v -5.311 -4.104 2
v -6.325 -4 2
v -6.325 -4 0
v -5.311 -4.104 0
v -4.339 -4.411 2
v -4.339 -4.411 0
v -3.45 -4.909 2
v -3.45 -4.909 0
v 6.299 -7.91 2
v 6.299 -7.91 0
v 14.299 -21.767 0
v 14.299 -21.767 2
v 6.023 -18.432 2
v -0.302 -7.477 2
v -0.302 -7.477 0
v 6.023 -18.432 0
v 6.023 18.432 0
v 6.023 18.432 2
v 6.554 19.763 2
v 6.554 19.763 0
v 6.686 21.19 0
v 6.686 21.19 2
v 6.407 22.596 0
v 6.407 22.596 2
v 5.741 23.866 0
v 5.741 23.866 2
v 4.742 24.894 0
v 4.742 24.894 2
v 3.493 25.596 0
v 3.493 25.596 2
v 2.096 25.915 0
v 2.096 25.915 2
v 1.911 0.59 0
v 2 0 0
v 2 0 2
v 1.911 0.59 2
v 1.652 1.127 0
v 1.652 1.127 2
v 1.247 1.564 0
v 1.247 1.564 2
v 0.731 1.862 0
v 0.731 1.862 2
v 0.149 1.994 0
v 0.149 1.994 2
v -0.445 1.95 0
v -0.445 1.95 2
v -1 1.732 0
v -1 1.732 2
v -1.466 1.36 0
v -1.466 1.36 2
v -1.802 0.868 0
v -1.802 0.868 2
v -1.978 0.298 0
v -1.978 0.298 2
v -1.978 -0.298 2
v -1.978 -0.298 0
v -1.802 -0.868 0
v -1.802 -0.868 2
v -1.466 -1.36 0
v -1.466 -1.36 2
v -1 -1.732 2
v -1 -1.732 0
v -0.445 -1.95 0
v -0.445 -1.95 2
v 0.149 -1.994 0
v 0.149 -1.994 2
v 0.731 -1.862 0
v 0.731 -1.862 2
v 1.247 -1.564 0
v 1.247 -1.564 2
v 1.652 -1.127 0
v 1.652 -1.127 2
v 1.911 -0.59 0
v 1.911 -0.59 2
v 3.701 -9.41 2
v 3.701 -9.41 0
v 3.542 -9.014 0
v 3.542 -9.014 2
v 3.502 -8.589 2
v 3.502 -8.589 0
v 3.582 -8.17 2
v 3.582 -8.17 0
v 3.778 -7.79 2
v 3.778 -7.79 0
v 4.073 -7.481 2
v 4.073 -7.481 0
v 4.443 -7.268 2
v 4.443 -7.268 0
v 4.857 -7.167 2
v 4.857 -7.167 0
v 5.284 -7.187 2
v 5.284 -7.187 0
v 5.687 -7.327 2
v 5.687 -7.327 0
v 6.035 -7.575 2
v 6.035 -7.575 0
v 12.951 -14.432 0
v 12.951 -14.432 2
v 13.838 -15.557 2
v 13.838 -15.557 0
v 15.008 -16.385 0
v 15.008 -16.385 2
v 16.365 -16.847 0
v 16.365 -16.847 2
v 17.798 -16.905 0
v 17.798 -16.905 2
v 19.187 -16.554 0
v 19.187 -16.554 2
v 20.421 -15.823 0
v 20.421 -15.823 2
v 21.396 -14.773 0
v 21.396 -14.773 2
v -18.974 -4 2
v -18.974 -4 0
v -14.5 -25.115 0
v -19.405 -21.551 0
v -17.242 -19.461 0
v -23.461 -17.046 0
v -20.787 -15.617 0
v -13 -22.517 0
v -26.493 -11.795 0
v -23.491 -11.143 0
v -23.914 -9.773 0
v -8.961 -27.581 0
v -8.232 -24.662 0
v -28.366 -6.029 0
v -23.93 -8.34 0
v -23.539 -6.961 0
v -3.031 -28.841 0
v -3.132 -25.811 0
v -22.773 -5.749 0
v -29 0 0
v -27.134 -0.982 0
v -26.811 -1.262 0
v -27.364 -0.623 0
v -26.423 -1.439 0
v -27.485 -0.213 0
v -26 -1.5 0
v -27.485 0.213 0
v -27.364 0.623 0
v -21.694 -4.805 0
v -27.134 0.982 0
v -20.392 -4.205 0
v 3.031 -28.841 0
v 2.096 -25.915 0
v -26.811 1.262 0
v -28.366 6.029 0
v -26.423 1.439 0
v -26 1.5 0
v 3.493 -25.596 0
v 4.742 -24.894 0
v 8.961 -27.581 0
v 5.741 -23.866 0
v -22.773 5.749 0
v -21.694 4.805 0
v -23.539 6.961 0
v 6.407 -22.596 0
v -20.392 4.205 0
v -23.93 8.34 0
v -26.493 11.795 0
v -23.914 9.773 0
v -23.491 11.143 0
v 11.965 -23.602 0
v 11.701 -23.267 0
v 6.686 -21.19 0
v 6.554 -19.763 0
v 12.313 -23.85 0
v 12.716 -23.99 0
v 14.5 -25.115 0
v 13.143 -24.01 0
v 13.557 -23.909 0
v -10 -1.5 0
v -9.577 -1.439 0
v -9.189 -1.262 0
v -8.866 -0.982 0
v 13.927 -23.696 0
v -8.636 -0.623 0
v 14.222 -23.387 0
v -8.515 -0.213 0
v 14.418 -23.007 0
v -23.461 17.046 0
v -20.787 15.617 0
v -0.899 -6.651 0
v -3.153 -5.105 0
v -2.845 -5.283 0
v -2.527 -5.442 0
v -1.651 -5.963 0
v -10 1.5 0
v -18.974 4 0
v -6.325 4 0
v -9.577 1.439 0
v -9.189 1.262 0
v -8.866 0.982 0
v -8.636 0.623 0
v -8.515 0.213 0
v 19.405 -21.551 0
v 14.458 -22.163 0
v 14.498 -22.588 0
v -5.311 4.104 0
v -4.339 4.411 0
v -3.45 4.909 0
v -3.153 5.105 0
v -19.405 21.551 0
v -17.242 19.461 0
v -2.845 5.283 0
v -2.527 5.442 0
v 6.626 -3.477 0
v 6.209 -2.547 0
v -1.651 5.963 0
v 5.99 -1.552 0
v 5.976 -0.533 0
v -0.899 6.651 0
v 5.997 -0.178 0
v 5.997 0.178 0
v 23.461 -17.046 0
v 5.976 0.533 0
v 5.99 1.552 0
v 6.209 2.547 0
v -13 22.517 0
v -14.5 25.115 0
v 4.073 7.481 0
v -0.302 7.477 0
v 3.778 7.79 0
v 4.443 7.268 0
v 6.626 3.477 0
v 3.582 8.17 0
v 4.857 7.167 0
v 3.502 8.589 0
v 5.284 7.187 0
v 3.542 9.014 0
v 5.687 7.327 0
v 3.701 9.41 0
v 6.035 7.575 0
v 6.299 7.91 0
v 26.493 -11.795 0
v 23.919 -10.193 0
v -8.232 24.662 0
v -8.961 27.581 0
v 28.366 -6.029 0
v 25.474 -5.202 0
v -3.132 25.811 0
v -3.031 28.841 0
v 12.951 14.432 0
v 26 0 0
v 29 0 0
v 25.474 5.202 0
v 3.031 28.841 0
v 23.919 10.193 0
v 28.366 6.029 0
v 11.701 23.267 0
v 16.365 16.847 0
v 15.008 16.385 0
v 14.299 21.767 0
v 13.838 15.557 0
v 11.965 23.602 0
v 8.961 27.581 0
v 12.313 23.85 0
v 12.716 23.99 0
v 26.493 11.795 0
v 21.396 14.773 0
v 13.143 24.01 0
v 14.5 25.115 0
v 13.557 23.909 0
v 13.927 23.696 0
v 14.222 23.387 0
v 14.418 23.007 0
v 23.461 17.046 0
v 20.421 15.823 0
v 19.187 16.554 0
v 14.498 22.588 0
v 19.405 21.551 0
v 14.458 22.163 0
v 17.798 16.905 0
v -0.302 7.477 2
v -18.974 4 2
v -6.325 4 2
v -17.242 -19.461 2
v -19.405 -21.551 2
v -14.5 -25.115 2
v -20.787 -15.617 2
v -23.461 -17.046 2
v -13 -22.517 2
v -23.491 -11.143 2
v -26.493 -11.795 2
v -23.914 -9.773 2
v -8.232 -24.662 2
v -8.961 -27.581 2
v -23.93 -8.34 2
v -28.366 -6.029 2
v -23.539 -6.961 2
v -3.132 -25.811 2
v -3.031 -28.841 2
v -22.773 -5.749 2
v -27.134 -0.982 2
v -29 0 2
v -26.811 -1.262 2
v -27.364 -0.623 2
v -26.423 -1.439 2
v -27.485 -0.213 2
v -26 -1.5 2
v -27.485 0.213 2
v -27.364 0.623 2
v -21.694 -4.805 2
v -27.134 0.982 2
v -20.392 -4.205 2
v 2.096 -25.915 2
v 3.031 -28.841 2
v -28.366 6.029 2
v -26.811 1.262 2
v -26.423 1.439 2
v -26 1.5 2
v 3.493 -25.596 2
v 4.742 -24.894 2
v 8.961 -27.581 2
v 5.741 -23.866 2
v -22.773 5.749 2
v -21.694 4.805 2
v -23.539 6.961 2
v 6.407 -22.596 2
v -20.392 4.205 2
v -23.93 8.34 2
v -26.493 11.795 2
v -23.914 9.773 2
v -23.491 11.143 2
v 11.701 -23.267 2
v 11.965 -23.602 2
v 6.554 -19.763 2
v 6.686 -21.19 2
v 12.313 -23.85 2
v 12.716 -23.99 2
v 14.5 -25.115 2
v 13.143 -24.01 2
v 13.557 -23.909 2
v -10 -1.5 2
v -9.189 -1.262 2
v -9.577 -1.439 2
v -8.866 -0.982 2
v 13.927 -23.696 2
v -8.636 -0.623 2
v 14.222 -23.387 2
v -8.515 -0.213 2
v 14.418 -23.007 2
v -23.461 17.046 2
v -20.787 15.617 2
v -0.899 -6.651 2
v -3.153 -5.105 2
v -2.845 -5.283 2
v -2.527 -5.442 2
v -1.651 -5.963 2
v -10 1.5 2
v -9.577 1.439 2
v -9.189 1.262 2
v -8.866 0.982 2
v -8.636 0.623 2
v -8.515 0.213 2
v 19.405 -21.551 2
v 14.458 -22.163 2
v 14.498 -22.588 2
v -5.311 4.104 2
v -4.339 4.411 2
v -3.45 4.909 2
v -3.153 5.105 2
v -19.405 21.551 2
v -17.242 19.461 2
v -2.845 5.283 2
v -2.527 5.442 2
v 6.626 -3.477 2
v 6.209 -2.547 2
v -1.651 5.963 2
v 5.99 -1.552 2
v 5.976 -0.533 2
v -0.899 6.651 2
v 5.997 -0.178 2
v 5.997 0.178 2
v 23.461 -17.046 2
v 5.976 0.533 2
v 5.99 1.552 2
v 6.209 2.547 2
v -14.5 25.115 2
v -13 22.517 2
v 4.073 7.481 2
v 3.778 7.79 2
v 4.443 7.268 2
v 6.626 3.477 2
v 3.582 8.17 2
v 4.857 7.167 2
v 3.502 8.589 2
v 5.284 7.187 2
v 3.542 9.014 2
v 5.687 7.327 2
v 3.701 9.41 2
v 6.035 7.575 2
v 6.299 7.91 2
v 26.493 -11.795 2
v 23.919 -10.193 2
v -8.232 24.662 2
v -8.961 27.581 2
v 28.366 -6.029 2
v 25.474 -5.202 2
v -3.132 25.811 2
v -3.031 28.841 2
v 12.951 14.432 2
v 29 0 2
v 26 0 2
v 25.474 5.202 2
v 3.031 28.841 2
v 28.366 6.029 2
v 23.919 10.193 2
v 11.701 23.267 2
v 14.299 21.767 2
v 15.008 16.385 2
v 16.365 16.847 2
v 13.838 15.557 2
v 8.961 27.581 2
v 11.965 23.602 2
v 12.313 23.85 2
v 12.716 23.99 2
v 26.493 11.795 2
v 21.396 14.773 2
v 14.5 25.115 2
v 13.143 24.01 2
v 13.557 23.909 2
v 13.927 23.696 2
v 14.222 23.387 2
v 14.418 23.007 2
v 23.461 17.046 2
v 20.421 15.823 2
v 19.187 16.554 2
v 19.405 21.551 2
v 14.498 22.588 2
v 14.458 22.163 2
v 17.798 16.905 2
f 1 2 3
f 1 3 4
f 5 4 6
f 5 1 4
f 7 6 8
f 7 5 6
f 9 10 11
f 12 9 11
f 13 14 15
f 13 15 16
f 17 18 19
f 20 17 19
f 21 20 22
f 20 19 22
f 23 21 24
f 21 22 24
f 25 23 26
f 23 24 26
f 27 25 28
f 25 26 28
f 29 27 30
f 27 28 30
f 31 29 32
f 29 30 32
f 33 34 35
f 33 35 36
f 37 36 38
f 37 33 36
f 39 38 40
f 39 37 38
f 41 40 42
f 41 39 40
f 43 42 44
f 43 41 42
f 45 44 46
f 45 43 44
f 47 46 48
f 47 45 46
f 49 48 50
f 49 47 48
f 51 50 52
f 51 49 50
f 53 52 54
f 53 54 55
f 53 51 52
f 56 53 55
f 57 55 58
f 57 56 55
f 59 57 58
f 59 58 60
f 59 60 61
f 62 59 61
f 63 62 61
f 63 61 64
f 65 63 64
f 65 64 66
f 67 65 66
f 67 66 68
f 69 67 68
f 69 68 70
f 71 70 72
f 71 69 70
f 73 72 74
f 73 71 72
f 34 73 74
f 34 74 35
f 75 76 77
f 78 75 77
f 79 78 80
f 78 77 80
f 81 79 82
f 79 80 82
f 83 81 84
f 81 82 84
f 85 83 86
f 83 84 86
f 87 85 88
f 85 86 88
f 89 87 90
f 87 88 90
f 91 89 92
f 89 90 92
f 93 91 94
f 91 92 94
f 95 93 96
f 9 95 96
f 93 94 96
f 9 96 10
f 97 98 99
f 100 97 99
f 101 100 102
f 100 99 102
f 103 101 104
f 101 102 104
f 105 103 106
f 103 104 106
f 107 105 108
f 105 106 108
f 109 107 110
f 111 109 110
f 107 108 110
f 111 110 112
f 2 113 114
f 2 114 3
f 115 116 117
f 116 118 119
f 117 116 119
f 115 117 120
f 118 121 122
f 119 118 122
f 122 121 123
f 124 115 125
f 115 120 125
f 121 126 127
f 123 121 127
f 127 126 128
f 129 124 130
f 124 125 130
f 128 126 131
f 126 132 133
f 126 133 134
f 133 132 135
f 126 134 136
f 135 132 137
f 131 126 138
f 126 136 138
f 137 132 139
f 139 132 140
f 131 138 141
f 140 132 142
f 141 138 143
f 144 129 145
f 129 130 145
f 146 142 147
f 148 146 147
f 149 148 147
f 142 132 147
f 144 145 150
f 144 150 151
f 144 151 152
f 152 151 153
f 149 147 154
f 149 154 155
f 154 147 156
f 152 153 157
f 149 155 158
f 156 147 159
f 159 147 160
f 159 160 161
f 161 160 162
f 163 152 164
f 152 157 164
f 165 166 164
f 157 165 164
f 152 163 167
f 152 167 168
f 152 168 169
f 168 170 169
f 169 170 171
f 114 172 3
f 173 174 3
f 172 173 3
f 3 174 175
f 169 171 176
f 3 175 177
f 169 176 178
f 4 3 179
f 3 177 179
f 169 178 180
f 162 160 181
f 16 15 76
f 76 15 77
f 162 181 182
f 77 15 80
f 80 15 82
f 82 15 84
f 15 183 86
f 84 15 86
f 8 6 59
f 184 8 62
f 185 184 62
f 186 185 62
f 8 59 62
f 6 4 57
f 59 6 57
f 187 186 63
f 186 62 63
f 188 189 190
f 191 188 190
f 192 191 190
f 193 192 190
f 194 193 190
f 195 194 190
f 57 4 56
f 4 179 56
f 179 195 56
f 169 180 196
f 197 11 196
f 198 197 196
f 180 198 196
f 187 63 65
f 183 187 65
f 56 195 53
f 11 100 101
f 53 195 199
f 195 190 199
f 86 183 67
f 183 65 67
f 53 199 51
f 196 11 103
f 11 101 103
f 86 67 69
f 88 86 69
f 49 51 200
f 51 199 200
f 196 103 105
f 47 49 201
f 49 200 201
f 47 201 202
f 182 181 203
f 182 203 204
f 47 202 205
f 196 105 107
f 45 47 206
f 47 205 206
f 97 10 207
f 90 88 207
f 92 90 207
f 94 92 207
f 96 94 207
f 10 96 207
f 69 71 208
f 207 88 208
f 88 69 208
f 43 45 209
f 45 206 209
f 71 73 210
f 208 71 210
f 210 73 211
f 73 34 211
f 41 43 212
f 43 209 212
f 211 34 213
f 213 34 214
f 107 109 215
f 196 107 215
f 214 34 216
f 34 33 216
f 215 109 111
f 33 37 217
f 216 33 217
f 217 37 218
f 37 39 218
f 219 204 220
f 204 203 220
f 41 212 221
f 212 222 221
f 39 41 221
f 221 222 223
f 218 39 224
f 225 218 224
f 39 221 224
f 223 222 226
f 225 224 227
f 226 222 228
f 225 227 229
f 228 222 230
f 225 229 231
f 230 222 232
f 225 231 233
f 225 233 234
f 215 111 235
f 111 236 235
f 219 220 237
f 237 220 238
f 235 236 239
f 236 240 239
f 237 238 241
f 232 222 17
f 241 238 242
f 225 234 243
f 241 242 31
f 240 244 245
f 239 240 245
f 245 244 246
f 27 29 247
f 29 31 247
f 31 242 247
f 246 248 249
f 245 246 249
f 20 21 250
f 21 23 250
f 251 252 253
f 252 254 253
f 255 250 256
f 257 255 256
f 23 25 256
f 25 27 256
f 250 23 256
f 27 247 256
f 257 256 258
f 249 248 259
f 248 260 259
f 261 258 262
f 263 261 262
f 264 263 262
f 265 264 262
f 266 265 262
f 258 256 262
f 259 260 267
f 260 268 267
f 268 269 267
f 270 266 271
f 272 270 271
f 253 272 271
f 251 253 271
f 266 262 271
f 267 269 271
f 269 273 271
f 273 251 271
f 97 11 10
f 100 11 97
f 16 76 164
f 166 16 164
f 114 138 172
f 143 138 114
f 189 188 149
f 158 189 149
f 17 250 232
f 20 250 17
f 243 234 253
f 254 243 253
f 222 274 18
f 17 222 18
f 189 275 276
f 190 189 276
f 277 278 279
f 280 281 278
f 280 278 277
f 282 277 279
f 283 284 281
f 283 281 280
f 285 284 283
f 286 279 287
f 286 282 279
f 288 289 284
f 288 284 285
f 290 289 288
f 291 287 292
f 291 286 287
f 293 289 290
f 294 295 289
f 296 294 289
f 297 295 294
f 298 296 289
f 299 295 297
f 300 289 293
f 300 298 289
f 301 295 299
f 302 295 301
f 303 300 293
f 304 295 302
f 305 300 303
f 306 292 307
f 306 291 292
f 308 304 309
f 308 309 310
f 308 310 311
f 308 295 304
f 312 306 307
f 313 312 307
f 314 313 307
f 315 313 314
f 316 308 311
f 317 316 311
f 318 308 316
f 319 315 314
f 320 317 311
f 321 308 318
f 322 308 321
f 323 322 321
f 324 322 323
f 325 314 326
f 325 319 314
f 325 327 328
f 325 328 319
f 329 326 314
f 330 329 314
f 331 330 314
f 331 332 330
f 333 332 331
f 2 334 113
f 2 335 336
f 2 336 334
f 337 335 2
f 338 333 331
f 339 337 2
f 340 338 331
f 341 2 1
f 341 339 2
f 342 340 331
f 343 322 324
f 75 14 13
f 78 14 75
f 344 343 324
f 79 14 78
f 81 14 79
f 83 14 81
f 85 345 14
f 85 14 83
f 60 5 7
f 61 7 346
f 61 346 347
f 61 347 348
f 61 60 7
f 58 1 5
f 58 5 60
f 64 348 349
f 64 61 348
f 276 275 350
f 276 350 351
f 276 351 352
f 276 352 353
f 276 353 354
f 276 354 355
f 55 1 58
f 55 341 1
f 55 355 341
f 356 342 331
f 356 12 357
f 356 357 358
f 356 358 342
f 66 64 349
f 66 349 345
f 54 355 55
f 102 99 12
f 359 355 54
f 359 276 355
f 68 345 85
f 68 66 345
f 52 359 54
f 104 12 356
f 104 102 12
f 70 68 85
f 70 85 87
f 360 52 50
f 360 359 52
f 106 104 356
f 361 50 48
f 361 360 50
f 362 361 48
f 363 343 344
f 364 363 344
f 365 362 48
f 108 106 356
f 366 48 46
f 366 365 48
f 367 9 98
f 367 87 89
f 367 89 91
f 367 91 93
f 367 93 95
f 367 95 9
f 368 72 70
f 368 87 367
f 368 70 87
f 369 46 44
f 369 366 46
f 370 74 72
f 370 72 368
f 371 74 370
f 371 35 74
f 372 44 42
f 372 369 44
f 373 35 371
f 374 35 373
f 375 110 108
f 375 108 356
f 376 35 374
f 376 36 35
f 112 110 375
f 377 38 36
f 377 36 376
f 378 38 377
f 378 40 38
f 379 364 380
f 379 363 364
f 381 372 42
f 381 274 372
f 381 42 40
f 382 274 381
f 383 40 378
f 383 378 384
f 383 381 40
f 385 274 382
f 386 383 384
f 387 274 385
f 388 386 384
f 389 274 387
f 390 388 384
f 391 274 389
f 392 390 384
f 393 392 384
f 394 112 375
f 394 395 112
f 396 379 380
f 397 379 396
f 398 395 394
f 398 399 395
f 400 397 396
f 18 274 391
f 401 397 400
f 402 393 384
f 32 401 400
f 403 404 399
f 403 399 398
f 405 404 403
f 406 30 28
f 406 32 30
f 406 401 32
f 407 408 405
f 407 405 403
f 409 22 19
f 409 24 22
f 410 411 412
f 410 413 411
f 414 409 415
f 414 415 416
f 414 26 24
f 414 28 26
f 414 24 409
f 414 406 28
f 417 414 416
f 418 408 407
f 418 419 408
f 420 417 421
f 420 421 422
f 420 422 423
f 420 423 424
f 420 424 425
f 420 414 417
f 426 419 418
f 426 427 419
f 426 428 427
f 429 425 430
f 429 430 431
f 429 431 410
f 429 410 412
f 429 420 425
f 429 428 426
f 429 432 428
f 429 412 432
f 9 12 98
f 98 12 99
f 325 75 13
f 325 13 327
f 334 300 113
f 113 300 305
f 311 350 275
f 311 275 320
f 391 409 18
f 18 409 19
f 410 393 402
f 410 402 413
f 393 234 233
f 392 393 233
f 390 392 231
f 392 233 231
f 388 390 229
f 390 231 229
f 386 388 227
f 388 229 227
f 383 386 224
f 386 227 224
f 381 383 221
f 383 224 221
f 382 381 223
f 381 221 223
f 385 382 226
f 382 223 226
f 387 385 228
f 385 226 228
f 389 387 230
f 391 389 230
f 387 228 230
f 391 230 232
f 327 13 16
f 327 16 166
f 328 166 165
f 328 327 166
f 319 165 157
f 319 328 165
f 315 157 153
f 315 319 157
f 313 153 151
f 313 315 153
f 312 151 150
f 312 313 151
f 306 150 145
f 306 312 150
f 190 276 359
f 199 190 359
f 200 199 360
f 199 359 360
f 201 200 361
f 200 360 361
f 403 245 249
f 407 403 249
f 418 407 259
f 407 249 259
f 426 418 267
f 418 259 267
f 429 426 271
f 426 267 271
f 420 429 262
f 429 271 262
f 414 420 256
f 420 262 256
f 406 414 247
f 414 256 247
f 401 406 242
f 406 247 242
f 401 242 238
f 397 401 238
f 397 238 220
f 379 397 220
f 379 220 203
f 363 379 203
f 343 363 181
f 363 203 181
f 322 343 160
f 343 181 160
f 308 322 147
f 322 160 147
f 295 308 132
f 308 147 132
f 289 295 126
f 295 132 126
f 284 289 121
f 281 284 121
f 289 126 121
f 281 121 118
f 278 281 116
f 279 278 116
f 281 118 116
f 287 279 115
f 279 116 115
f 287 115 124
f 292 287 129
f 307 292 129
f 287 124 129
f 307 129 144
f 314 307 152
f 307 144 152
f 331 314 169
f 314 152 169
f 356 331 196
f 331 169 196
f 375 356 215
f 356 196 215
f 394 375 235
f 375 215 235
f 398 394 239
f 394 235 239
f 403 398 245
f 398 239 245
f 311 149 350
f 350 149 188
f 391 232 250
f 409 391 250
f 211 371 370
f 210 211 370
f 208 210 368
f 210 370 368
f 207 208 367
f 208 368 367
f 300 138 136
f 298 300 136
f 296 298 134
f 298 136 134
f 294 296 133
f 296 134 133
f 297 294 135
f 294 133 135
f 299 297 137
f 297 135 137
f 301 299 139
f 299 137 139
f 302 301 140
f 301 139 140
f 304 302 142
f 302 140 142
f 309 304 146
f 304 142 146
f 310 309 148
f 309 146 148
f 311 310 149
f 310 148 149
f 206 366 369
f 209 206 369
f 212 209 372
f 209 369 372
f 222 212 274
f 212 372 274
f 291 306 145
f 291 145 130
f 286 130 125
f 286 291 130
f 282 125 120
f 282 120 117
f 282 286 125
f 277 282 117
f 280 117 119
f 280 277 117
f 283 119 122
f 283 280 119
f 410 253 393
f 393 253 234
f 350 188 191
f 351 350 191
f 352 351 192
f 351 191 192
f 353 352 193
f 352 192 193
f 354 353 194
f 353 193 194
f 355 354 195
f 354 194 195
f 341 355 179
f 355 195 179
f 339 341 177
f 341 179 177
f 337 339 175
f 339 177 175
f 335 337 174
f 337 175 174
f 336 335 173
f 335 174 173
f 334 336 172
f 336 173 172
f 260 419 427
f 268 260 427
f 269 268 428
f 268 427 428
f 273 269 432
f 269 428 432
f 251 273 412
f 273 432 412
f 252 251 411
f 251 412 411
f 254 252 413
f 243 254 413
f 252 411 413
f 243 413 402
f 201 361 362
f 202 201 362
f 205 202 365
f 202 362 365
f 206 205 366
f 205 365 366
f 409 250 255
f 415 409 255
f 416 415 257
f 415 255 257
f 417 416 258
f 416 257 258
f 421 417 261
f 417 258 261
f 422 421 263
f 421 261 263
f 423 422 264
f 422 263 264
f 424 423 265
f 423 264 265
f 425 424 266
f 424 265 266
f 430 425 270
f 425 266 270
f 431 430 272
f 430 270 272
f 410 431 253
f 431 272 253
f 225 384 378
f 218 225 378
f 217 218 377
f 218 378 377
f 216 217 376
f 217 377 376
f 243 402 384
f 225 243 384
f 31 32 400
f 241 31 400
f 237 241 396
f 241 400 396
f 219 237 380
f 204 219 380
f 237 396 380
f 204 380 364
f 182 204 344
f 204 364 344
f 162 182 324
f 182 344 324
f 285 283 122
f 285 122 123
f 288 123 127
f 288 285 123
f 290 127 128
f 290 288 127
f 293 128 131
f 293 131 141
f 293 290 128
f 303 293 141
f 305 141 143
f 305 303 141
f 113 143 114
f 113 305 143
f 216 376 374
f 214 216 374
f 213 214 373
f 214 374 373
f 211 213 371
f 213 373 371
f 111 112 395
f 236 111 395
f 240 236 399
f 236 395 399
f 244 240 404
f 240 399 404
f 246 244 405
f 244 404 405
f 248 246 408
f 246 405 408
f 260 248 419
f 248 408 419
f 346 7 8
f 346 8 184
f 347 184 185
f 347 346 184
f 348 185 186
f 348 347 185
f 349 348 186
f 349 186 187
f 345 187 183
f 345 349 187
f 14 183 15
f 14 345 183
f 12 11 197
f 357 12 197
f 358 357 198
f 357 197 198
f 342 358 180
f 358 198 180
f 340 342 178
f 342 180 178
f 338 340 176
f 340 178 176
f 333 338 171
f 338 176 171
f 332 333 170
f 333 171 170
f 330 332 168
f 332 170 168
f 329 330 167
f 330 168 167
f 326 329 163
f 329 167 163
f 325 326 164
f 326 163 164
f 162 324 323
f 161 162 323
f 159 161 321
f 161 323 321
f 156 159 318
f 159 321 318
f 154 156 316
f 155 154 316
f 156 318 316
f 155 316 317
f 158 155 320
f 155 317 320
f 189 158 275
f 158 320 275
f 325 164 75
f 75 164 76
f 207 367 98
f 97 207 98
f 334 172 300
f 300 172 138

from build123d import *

# Parameters (mm, degrees)
SKETCH_1_R          = 29
SKETCH_1_R_2        = 2
EXTRUDE_1_DEPTH     = 2
CUT_EXTRUDE_1_DEPTH = 2


with BuildPart() as part:
    # 草图1 → 凸台-拉伸1 (new body)
    with BuildSketch(Plane.XY):
        Circle(SKETCH_1_R)
        Circle(SKETCH_1_R_2, mode=Mode.SUBTRACT)
        with BuildLine():
            Line((-10, -1.5), (-26, -1.5))
            ThreePointArc((-26, -1.5), (-27.5, 0), (-26, 1.5))
            Line((-26, 1.5), (-10, 1.5))
            ThreePointArc((-10, 1.5), (-8.5, 0), (-10, -1.5))
        make_face(mode=Mode.SUBTRACT)
        with BuildLine():
            Line((3.700961894, 9.410254038), (11.700961894, 23.266660498))
            ThreePointArc((11.700961894, 23.266660498), (13.75, 23.815698604), (14.299038106, 21.766660498))
            Line((14.299038106, 21.766660498), (6.299038106, 7.910254038))
            ThreePointArc((6.299038106, 7.910254038), (4.25, 7.361215932), (3.700961894, 9.410254038))
        make_face(mode=Mode.SUBTRACT)
        with BuildLine():
            Line((6.299038106, -7.910254038), (14.299038106, -21.766660498))
            ThreePointArc((14.299038106, -21.766660498), (13.75, -23.815698604), (11.700961894, -23.266660498))
            Line((11.700961894, -23.266660498), (3.700961894, -9.410254038))
            ThreePointArc((3.700961894, -9.410254038), (4.25, -7.361215932), (6.299038106, -7.910254038))
        make_face(mode=Mode.SUBTRACT)
    extrude(amount=EXTRUDE_1_DEPTH)

    # 草图2 → 切除-拉伸1 (cut)
    with BuildSketch(Plane.XY.offset(2)):
        with BuildLine():
            Line((-18.973665961, 4), (-6.32455532, 4))
            ThreePointArc((-6.32455532, 4), (-4.816998597, 4.232687054), (-3.449757447, 4.909090909))
            ThreePointArc((-3.449757447, 4.909090909), (-3, 5.196152423), (-2.526518713, 5.442123041))
            ThreePointArc((-2.526518713, 5.442123041), (-1.257115216, 6.287986682), (-0.301823955, 7.477225575))
            Line((-0.301823955, 7.477225575), (6.022731365, 18.431676725))
            ThreePointArc((6.022731365, 18.431676725), (6.120040233, 23.254995789), (2.095605381, 25.915409279))
            ThreePointArc((2.095605381, 25.915409279), (-13, 22.516660498), (-23.491205476, 11.142857143))
            ThreePointArc((-23.491205476, 11.142857143), (-23.199437235, 6.327387581), (-18.973665961, 4))
        make_face()
        with BuildLine():
            Line((-18.973665961, -4), (-6.32455532, -4))
            ThreePointArc((-6.32455532, -4), (-4.816998597, -4.232687054), (-3.449757447, -4.909090909))
            ThreePointArc((-3.449757447, -4.909090909), (-3, -5.196152423), (-2.526518713, -5.442123041))
            ThreePointArc((-2.526518713, -5.442123041), (-1.257115216, -6.287986682), (-0.301823955, -7.477225575))
            Line((-0.301823955, -7.477225575), (6.022731365, -18.431676725))
            ThreePointArc((6.022731365, -18.431676725), (6.120040233, -23.254995789), (2.095605381, -25.915409279))
            ThreePointArc((2.095605381, -25.915409279), (-13, -22.516660498), (-23.491205476, -11.142857143))
            ThreePointArc((-23.491205476, -11.142857143), (-23.199437235, -6.327387581), (-18.973665961, -4))
        make_face()
        with BuildLine():
            Line((12.950934596, 14.431676725), (6.626379275, 3.477225575))
            ThreePointArc((6.626379275, 3.477225575), (6.074113814, 2.055299628), (5.97627616, 0.533032132))
            ThreePointArc((5.97627616, 0.533032132), (6, 0), (5.97627616, -0.533032132))
            ThreePointArc((5.97627616, -0.533032132), (6.074113814, -2.055299628), (6.626379275, -3.477225575))
            Line((6.626379275, -3.477225575), (12.950934596, -14.431676725))
            ThreePointArc((12.950934596, -14.431676725), (17.079397002, -16.927608208), (21.395600094, -14.772552136))
            ThreePointArc((21.395600094, -14.772552136), (26, 0), (21.395600094, 14.772552136))
            ThreePointArc((21.395600094, 14.772552136), (17.079397002, 16.927608208), (12.950934596, 14.431676725))
        make_face()
    extrude(amount=-CUT_EXTRUDE_1_DEPTH, mode=Mode.SUBTRACT)


solid = part.part
